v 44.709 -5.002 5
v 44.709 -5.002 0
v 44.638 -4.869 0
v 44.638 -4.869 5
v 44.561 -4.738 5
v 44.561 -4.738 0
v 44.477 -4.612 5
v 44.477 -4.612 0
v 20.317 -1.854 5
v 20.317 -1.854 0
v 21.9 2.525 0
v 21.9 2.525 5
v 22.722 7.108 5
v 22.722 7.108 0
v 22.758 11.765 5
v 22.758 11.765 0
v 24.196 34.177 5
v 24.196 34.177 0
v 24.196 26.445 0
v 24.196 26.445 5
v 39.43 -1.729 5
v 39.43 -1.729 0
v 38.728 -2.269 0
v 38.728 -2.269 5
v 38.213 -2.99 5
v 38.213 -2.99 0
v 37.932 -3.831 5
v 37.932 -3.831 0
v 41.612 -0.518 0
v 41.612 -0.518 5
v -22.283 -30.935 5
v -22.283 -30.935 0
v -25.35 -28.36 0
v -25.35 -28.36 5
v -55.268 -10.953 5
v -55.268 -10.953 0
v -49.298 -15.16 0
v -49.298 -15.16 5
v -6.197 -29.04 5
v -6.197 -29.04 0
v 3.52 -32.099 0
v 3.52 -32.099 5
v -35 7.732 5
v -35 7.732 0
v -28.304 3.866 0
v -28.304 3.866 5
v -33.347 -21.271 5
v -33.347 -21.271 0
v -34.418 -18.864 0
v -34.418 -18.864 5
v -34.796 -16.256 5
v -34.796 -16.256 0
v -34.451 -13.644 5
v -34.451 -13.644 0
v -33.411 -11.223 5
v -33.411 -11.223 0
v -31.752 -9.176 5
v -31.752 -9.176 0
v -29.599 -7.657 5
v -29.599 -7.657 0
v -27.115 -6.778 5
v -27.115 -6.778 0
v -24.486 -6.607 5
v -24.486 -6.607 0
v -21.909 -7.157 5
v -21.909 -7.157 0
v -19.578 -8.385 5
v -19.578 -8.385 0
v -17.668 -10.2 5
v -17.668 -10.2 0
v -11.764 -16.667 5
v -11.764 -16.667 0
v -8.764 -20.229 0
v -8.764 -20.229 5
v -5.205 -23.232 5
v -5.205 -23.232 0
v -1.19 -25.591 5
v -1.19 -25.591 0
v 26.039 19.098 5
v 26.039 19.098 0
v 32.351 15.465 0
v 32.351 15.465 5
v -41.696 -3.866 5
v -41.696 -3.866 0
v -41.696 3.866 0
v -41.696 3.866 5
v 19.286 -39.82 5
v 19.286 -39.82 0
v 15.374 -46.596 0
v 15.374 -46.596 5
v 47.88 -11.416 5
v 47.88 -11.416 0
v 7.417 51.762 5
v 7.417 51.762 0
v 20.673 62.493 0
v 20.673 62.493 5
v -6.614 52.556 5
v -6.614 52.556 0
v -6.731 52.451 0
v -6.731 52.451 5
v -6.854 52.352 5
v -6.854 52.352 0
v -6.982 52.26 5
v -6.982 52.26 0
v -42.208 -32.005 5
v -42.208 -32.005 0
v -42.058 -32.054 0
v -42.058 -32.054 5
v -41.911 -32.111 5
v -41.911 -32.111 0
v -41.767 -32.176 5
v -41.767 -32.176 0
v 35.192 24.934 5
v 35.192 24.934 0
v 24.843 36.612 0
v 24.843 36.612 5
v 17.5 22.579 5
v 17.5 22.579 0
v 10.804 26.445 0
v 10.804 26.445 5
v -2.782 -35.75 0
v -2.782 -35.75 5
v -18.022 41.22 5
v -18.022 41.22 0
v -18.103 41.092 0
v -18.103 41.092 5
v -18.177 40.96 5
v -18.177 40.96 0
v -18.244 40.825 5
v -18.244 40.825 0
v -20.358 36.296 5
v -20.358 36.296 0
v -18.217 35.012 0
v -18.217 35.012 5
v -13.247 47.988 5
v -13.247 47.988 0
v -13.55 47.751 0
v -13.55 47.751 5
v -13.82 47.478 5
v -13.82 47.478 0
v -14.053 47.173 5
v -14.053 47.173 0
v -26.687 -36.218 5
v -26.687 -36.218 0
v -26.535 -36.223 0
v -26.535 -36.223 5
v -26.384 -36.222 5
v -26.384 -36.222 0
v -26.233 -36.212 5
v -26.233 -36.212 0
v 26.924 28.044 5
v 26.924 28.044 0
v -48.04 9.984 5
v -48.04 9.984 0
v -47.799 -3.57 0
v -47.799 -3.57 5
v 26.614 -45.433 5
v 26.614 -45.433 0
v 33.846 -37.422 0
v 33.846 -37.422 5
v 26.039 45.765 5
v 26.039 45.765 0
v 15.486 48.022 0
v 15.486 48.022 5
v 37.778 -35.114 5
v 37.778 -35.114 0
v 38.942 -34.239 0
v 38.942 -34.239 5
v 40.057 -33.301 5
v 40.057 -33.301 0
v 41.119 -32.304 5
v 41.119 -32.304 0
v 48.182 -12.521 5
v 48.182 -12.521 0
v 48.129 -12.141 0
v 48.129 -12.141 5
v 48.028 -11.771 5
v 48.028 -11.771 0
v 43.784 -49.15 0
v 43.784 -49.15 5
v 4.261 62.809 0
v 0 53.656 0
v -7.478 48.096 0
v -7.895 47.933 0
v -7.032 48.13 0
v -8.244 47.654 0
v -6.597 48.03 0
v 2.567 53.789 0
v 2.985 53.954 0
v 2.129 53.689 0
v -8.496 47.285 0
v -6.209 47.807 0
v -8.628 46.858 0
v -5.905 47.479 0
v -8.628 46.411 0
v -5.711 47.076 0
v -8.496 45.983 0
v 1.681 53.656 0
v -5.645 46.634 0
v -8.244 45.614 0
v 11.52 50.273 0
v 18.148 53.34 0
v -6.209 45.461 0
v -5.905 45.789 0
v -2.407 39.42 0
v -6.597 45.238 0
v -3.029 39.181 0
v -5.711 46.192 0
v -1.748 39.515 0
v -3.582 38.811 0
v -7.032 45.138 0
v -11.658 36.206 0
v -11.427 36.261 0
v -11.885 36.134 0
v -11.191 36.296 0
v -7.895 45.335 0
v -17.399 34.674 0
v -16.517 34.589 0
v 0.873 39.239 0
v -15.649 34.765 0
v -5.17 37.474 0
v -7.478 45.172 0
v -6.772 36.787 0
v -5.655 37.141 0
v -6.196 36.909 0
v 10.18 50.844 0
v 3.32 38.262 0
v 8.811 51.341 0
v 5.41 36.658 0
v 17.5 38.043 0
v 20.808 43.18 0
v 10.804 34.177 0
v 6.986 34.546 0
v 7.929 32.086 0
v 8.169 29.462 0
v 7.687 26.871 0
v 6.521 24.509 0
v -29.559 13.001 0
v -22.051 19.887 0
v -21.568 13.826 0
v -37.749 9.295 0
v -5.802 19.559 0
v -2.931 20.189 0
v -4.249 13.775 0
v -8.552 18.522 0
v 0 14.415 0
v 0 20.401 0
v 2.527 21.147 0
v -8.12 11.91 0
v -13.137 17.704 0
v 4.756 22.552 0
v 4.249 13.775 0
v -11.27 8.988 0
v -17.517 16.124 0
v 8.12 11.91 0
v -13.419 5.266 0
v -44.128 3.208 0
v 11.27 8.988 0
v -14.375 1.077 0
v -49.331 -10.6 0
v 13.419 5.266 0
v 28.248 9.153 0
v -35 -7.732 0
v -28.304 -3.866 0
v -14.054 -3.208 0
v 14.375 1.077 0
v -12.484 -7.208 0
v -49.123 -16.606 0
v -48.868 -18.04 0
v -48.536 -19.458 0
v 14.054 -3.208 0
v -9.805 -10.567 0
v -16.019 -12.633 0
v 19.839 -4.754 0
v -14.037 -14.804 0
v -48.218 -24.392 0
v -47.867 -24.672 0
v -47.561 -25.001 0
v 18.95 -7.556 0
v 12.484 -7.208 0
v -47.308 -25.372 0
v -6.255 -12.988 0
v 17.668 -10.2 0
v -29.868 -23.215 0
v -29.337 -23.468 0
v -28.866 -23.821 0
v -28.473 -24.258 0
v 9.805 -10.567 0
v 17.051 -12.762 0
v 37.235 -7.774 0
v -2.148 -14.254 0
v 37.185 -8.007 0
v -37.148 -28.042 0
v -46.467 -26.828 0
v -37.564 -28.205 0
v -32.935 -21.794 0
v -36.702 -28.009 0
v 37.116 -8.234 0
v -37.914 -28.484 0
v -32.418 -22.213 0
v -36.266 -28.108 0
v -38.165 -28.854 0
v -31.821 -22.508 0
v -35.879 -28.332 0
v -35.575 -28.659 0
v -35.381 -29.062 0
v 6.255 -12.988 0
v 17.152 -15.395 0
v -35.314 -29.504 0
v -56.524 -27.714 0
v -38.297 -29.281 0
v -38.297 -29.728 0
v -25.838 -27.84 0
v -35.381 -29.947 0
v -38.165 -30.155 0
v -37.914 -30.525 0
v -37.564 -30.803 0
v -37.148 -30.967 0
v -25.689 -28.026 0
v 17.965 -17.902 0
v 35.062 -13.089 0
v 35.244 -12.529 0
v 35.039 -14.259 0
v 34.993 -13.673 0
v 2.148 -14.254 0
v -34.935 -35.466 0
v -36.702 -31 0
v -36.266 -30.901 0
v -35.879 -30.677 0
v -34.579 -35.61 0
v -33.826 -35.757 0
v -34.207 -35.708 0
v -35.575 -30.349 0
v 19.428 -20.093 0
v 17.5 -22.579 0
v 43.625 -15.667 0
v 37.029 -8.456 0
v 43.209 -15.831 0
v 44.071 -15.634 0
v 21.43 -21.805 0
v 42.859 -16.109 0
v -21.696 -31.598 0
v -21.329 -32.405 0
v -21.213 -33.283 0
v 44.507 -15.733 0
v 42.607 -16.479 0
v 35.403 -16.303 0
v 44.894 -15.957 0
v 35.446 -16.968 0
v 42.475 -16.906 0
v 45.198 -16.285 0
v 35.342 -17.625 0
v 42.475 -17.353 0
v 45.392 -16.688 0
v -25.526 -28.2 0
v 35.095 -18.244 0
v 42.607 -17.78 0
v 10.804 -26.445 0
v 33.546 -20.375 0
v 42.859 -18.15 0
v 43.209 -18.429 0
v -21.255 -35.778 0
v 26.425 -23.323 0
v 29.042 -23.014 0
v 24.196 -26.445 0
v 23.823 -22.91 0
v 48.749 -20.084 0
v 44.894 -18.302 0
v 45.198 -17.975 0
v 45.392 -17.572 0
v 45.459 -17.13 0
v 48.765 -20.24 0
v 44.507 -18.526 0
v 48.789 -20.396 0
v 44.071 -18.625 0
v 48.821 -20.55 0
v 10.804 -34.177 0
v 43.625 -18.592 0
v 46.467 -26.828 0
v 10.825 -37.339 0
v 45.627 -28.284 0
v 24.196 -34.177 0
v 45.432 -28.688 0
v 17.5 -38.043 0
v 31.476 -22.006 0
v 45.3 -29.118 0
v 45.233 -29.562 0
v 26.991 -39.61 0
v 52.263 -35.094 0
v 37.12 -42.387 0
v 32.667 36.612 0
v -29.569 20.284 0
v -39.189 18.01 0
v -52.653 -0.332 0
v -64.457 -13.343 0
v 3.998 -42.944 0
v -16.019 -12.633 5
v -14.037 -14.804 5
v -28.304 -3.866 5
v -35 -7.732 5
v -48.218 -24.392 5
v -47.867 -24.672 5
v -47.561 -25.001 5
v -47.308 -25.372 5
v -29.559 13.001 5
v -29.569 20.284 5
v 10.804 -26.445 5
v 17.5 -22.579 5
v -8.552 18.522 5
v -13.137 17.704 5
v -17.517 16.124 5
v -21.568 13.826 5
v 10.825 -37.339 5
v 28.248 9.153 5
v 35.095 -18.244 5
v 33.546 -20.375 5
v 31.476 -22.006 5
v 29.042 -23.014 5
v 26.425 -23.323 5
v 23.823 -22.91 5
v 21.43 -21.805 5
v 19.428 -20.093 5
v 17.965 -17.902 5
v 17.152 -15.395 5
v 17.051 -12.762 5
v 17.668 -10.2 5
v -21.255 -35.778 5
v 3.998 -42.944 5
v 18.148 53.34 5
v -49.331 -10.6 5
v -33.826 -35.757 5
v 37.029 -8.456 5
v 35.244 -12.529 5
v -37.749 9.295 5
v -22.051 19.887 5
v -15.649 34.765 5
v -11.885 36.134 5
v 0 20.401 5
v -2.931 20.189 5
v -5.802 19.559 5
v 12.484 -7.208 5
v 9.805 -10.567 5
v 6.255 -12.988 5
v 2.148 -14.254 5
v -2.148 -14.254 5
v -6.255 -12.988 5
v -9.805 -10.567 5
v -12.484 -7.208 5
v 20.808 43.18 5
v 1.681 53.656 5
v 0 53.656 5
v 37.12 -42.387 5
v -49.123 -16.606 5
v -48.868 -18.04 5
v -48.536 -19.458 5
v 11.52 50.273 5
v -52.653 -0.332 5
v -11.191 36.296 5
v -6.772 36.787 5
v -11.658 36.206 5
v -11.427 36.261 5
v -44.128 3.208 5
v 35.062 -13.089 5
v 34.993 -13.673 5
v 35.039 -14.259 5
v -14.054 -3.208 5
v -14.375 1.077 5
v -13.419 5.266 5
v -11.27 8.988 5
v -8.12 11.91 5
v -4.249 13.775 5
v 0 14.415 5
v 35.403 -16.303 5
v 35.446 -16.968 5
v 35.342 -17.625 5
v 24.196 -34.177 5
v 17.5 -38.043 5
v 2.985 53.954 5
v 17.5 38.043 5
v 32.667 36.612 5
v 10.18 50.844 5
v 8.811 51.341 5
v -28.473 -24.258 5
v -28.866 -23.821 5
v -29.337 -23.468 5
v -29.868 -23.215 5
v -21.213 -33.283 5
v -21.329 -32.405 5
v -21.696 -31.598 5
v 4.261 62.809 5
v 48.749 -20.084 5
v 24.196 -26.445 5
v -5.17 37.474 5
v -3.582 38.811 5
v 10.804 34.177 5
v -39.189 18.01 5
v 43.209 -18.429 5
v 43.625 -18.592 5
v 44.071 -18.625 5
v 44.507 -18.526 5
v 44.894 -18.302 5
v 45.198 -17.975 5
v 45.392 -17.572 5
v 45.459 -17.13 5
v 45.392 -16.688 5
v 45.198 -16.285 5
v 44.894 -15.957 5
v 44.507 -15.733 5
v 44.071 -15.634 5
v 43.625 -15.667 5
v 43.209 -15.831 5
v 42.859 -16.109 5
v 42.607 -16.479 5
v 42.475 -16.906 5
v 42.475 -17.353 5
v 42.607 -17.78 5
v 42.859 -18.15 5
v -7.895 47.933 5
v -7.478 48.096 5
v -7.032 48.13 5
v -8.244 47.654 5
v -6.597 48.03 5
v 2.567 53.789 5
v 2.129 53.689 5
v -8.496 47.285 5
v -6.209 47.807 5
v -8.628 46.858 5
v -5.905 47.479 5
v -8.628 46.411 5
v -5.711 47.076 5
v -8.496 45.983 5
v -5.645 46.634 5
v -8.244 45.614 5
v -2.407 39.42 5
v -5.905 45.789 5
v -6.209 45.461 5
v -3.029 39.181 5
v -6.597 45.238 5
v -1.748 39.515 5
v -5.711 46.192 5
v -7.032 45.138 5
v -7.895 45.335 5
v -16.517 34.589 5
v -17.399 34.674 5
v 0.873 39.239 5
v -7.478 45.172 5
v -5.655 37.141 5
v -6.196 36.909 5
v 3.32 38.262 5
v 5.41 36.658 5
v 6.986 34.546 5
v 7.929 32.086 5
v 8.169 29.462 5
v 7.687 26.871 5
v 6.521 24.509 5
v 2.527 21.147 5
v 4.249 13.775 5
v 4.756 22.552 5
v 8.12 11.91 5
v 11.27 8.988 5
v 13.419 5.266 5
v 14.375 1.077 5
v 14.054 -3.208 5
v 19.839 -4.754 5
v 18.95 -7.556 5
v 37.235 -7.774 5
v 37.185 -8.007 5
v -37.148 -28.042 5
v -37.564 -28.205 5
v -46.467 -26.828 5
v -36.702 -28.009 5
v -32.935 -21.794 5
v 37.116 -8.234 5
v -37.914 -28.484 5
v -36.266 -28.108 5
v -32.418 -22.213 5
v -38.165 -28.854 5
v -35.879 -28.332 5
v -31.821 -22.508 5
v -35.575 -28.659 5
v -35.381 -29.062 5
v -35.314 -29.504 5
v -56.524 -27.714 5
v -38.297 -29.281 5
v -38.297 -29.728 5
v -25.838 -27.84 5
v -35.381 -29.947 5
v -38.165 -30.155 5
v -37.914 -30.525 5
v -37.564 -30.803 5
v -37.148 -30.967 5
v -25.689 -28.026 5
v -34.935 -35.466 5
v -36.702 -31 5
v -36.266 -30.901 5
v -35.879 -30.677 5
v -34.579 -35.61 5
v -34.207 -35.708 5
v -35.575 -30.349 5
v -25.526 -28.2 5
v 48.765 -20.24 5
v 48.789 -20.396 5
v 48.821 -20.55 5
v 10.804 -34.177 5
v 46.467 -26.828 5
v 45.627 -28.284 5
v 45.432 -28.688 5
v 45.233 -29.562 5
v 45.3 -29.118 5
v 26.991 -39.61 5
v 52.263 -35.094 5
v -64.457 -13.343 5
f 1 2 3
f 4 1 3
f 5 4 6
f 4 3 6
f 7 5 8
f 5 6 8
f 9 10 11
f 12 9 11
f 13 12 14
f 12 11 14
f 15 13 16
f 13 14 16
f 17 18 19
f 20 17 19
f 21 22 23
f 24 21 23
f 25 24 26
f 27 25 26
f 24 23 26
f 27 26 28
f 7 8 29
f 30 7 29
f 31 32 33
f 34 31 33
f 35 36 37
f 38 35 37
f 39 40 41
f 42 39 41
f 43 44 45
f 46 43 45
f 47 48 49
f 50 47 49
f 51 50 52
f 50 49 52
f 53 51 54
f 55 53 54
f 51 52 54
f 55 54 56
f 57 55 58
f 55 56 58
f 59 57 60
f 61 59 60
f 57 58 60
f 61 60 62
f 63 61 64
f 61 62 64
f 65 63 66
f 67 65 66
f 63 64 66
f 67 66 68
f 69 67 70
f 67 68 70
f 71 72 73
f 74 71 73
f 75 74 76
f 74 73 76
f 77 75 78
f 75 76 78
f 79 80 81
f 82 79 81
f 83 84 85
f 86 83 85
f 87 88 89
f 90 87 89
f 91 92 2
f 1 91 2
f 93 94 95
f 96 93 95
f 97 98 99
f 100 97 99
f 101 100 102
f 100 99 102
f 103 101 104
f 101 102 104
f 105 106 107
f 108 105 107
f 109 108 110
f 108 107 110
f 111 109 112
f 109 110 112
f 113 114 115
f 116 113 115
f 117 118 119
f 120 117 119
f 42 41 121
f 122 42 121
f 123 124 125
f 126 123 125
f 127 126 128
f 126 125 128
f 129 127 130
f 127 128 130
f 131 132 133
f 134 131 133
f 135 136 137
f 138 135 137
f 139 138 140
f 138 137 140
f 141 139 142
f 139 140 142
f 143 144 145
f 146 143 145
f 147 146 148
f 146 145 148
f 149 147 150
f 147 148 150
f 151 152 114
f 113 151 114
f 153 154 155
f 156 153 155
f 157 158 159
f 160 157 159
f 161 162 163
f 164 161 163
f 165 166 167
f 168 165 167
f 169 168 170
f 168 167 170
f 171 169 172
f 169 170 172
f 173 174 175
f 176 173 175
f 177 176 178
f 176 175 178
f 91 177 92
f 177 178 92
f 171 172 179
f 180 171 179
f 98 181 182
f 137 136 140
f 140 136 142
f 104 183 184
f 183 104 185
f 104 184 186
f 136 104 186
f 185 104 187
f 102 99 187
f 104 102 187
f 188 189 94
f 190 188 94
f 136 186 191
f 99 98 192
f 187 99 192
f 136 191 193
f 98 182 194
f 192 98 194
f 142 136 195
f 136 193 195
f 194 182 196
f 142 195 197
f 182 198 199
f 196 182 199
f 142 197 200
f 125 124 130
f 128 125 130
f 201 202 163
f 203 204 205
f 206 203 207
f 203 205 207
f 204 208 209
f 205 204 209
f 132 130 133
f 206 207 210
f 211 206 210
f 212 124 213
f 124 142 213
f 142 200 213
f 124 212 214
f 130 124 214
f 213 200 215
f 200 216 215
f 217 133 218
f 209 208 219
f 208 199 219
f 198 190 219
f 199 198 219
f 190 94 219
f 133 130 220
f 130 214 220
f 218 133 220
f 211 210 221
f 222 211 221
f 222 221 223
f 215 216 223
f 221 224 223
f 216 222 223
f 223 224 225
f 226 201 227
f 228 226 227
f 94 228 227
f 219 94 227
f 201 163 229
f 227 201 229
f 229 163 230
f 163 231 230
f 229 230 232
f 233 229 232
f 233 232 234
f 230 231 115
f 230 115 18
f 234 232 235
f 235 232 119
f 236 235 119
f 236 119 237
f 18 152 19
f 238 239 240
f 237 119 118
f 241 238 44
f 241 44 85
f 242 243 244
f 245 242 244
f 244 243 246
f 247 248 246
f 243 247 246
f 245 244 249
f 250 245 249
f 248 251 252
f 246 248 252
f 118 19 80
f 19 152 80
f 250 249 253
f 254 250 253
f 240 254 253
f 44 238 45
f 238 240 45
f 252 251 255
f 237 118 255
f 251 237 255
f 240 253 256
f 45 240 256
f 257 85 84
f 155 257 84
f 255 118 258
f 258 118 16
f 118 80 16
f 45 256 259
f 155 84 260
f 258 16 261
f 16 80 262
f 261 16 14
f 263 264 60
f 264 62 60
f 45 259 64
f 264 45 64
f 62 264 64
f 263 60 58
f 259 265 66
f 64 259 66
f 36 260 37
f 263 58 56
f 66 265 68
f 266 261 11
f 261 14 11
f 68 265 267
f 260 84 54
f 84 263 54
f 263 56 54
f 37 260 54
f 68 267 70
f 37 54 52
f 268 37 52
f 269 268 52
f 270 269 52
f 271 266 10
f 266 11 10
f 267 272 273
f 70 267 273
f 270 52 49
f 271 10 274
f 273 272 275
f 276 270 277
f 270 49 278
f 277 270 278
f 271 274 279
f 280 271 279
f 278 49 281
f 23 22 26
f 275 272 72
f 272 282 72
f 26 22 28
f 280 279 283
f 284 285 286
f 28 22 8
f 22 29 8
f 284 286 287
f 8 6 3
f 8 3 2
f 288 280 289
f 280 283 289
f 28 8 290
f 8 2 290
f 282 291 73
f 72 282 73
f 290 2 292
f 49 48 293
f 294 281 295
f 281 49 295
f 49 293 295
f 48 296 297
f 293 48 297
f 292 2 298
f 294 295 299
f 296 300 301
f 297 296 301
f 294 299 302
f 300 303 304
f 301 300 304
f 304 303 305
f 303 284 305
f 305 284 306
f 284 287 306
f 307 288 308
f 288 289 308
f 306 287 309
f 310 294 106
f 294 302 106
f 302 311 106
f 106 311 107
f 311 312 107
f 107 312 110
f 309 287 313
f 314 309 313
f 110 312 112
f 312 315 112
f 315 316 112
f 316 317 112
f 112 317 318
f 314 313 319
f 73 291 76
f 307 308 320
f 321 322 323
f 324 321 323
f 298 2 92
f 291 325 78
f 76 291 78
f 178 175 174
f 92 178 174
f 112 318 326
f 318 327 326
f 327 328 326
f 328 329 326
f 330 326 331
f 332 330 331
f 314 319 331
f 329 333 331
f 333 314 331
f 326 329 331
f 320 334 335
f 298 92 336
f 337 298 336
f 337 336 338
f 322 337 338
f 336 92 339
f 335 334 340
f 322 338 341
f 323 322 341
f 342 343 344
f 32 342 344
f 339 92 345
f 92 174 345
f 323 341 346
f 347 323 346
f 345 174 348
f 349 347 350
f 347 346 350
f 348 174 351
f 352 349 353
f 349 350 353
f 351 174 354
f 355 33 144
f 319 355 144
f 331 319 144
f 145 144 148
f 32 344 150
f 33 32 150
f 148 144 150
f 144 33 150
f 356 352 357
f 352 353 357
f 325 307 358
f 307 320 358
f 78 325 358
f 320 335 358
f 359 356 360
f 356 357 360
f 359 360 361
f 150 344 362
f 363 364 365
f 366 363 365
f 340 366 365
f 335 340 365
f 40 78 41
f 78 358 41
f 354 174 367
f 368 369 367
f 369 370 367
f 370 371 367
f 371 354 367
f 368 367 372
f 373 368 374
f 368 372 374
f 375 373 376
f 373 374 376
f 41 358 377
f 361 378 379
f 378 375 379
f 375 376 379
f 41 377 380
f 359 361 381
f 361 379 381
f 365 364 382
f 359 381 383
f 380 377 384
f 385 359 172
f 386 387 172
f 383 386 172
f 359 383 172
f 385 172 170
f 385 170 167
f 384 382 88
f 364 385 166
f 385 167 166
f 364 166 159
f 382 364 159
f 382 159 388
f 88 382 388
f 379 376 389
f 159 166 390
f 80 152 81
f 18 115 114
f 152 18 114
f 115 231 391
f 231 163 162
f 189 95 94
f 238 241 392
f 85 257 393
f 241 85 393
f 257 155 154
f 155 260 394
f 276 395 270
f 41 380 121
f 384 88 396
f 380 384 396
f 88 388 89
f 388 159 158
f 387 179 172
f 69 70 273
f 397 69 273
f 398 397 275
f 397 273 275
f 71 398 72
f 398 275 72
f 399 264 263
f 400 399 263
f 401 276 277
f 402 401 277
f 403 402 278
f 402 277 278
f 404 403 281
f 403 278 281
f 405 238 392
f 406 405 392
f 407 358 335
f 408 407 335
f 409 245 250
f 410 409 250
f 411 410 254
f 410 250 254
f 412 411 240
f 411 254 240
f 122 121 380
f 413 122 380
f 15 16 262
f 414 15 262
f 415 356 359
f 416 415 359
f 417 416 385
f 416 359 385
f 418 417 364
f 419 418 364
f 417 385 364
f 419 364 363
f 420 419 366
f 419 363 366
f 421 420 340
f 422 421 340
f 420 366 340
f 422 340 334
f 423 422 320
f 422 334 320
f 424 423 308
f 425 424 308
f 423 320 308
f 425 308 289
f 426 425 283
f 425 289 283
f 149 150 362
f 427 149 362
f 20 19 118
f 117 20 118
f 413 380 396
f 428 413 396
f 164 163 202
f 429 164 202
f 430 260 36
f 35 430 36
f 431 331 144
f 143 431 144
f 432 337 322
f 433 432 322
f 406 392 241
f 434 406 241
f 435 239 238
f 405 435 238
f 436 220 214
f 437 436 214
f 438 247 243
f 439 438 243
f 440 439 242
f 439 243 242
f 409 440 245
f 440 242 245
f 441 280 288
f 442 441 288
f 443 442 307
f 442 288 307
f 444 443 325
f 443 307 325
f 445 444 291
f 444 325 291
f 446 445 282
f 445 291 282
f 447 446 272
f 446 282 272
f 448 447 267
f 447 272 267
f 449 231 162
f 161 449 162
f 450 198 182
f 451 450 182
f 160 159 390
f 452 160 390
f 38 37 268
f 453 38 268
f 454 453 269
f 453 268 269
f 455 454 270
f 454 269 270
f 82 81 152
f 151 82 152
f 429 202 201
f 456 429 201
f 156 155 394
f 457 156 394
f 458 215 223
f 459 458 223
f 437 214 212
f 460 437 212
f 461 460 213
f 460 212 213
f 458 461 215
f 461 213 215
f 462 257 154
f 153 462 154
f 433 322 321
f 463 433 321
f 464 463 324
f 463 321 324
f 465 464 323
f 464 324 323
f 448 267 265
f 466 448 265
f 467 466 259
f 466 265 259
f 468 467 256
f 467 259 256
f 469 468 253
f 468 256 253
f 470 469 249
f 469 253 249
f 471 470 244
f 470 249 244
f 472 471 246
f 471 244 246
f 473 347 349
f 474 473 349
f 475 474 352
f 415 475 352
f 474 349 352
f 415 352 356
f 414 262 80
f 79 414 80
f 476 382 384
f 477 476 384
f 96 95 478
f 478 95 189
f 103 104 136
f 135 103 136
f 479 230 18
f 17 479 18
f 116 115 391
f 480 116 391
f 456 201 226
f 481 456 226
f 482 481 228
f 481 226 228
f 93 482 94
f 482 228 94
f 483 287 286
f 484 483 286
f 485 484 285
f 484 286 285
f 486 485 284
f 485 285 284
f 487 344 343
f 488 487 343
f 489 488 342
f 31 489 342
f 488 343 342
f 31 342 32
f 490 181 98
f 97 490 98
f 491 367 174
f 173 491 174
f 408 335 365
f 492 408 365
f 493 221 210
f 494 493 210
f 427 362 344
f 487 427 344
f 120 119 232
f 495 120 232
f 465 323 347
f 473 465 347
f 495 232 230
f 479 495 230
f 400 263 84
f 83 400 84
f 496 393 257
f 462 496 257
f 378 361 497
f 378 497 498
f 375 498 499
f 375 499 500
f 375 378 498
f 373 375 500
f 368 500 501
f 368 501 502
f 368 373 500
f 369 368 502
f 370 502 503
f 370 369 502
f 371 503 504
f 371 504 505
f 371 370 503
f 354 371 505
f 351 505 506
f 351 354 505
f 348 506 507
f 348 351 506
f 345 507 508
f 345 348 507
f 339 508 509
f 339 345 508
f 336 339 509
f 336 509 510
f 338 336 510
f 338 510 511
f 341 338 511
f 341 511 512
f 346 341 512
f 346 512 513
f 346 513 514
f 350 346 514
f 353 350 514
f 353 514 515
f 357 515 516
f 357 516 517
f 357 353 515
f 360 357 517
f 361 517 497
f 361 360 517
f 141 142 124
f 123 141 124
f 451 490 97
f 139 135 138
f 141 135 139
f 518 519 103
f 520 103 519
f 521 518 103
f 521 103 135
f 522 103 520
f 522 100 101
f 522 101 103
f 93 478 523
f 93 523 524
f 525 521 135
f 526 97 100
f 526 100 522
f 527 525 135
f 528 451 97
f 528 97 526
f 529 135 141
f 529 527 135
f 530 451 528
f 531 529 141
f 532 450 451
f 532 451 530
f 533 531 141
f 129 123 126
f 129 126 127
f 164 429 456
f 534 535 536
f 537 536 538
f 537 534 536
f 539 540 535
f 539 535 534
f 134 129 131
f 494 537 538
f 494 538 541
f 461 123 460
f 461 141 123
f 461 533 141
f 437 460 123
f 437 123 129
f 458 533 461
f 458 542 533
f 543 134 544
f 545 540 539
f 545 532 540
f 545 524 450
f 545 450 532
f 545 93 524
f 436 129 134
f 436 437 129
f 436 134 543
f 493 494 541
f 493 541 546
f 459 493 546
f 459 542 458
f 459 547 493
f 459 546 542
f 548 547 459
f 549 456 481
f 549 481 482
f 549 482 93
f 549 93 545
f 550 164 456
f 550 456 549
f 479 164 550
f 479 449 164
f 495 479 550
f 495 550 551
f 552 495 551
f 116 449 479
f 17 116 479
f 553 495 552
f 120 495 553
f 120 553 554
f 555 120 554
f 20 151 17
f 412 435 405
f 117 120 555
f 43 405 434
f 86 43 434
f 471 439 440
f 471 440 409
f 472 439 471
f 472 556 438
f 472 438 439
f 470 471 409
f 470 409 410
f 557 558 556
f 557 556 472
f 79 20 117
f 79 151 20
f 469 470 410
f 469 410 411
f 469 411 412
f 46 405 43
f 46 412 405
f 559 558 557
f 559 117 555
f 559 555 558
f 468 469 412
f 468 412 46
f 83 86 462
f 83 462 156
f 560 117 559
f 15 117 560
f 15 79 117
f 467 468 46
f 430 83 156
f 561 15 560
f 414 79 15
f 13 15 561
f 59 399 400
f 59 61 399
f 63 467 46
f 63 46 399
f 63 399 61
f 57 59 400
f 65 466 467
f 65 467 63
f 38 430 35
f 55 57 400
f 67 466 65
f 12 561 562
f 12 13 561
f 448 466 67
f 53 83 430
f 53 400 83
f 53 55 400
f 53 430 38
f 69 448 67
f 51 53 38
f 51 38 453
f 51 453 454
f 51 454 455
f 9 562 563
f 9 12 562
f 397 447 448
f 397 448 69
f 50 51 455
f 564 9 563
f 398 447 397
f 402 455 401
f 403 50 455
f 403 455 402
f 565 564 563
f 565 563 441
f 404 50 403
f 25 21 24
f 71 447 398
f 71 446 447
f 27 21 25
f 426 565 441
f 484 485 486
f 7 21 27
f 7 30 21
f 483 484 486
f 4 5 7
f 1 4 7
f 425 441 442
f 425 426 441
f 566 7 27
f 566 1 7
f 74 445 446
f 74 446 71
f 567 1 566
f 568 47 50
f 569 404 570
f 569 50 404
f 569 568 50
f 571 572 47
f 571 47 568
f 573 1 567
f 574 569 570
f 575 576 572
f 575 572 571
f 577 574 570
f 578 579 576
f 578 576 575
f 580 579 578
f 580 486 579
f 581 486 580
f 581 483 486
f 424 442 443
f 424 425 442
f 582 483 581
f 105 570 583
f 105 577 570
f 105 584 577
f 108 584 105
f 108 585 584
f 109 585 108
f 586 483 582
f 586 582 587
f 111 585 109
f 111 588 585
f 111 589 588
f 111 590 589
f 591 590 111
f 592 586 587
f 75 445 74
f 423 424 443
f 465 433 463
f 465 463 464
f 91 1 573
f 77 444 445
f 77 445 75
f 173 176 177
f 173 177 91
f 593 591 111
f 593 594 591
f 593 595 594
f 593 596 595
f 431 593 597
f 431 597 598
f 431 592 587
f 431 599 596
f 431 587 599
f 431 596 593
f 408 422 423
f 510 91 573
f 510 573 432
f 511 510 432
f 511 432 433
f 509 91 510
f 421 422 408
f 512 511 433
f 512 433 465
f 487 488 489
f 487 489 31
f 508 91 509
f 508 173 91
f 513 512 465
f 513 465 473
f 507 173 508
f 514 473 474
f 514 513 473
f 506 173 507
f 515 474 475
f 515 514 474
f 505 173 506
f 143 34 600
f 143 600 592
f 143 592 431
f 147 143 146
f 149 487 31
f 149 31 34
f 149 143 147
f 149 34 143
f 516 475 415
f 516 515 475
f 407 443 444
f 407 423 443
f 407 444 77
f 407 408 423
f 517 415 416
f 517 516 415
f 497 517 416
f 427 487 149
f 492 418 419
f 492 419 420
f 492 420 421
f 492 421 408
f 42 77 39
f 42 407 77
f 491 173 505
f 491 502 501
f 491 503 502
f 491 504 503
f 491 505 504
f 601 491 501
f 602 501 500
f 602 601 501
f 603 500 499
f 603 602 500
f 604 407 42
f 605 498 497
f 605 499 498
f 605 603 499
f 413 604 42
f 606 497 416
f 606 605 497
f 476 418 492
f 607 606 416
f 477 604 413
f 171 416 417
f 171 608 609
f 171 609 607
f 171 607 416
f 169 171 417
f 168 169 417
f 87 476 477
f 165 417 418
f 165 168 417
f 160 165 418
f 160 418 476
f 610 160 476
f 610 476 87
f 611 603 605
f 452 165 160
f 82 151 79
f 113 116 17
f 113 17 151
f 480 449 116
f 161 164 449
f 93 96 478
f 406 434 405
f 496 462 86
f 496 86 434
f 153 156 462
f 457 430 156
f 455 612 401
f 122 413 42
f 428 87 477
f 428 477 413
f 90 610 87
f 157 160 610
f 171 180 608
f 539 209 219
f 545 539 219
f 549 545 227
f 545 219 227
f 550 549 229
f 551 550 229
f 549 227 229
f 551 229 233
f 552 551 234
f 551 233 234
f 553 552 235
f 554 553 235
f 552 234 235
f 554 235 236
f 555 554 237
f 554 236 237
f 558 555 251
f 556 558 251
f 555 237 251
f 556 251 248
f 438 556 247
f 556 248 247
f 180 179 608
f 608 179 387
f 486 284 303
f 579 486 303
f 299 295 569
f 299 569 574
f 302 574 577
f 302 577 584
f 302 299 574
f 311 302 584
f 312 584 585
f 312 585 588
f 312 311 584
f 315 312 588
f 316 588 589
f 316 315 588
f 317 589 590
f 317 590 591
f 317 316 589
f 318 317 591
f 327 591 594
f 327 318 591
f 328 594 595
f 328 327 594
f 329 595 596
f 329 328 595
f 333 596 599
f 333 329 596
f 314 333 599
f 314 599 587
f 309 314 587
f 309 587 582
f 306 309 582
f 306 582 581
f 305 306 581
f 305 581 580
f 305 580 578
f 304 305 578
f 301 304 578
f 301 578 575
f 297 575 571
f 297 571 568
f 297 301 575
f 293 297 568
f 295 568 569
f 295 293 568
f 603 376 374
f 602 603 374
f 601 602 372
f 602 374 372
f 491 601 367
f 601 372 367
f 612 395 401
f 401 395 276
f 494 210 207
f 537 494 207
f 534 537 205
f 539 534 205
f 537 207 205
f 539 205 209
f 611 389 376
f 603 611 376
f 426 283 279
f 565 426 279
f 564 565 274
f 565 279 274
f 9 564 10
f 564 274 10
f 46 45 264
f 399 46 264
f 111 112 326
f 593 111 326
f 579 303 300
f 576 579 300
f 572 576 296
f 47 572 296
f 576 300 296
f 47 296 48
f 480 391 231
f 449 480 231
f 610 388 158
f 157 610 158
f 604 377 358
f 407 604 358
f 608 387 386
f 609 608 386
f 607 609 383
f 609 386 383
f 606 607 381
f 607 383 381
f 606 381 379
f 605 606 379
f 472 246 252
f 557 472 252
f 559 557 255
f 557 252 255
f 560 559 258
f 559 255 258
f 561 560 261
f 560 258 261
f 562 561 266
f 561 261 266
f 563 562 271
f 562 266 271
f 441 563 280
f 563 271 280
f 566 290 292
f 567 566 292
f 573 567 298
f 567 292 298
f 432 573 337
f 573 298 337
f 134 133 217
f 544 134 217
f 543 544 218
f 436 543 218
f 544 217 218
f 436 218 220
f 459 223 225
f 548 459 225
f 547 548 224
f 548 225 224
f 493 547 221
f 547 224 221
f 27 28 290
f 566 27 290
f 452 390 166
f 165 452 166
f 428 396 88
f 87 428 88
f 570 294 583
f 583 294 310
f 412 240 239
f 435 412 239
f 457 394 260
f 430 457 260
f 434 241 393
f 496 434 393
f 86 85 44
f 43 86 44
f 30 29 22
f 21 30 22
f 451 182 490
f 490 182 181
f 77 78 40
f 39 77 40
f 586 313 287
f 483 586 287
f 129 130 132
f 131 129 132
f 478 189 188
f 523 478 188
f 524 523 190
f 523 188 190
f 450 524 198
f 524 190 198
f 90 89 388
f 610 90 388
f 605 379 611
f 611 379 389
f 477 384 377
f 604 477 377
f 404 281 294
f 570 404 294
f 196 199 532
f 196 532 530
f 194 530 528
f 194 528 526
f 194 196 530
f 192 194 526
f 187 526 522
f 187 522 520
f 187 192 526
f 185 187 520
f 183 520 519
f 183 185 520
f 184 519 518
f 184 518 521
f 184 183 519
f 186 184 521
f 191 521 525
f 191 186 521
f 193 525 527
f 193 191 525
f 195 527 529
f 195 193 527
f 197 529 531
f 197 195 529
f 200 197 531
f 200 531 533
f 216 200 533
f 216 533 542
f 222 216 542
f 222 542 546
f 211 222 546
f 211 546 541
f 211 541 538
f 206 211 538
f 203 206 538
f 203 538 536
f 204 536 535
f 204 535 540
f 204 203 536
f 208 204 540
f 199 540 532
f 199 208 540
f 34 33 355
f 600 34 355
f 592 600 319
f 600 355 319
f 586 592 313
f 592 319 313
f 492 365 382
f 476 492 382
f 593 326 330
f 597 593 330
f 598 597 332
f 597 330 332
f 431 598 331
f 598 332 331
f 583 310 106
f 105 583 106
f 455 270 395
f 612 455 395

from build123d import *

# Parameters (mm, degrees)
F0_R     = 1.5
F1_DEPTH = 5
F3_COUNT = 3


# Not quite as in the source:
# - a feature names something its author has since deleted; it is built from what else it names


with BuildPart() as f1:
    # F0 (on Top) → F1 (new body)
    with BuildSketch(Plane.XY):
        with BuildLine():
            ThreePointArc((-1.7478732612, 39.5149783142), (8.1392001596, 30.7821912097), (0, 20.4009960858))
            Line((0, 20.4009960858), (0, 14.4152096754))
            ThreePointArc((0, 14.4152096754), (12.4839377798, 7.2076048377), (12.4839377798, -7.2076048377))
            Line((12.4839377798, -7.2076048377), (17.6677808728, -10.2004980429))
            ThreePointArc((17.6677808728, -10.2004980429), (19.4452285789, -6.171201407), (20.3165472355, -1.8543326892))
            ThreePointArc((20.3165472355, -1.8543326892), (22.4085751719, 4.7991946551), (22.7576271971, 11.7651238603))
            Line((22.7576271971, 11.7651238603), (28.2481051981, 9.1530177742))
            Line((28.2481051981, 9.1530177742), (26.0387565941, 19.0982837094))
            Line((26.0387565941, 19.0982837094), (32.3511809111, 15.4654439539))
            Line((32.3511809111, 15.4654439539), (26.9242947963, 28.0441137764))
            Line((26.9242947963, 28.0441137764), (35.1917743683, 24.9340832233))
            Line((35.1917743683, 24.9340832233), (24.8427105993, 36.6120710969))
            Line((24.8427105993, 36.6120710969), (32.6668024063, 36.6120710969))
            Line((32.6668024063, 36.6120710969), (20.8077298225, 43.1800760308))
            Line((20.8077298225, 43.1800760308), (26.0387565941, 45.7650870085))
            Line((26.0387565941, 45.7650870085), (15.485866915, 48.02231204))
            Line((15.485866915, 48.02231204), (18.1482266635, 53.3400028944))
            Line((18.1482266635, 53.3400028944), (11.520179105, 50.2734731867))
            ThreePointArc((11.520179105, 50.2734731867), (9.4992839441, 51.1021592503), (7.4171009474, 51.7618954182))
            Line((7.4171009474, 51.7618954182), (20.6731967628, 62.493018806))
            Line((20.6731967628, 62.493018806), (2.9851620813, 53.9539658583))
            ThreePointArc((2.9851620813, 53.9539658583), (2.3498823759, 53.7311579429), (1.6809146705, 53.6556206644))
            Line((1.6809146705, 53.6556206644), (0, 53.6556206644))
            Line((0, 53.6556206644), (4.2608887888, 62.8086403012))
            Line((4.2608887888, 62.8086403012), (-6.6135251858, 52.5556231266))
            ThreePointArc((-6.6135251858, 52.5556231266), (-6.7917072446, 52.4004137483), (-6.9815525166, 52.2597099106))
            Line((-6.9815525166, 52.2597099106), (-13.2472028108, 47.9876733272))
            ThreePointArc((-13.2472028108, 47.9876733272), (-13.6895314092, 47.6192351761), (-14.0533422232, 47.1730928761))
            Line((-14.0533422232, 47.1730928761), (-18.0220315222, 41.2200618552))
            ThreePointArc((-18.0220315222, 41.2200618552), (-18.1407171431, 41.0265497088), (-18.2444304369, 40.824617096))
            Line((-18.2444304369, 40.824617096), (-20.3575752676, 36.2964496017))
            Line((-20.3575752676, 36.2964496017), (-18.2173253559, 35.0123005809))
            ThreePointArc((-18.2173253559, 35.0123005809), (-16.9608718875, 34.5985427406), (-15.6486105692, 34.7653992696))
            Line((-15.6486105692, 34.7653992696), (-11.8852458251, 36.1338942554))
            ThreePointArc((-11.8852458251, 36.1338942554), (-11.5431146027, 36.2357083507), (-11.1913122519, 36.2961648589))
            Line((-11.1913122519, 36.2961648589), (-6.7715043443, 36.7872549082))
            ThreePointArc((-6.7715043443, 36.7872549082), (-5.920047927, 37.0118969078), (-5.1704976221, 37.4740834492))
            Line((-5.1704976221, 37.4740834492), (-3.5822876233, 38.8113983631))
            ThreePointArc((-3.5822876233, 38.8113983631), (-2.7243104061, 39.3176161279), (-1.7478732612, 39.5149783142))
        make_face()
        with Locations((-7.1445683185, 46.6340765733)):
            Circle(F0_R, mode=Mode.SUBTRACT)
        Polygon((10.8037195943, 34.1769884273), (17.5, 38.0430877221), (24.1962804057, 34.1769884273), (24.1962804057, 26.4447898377), (17.5, 22.5786905429), (10.8037195943, 26.4447898377), align=None, mode=Mode.SUBTRACT)
    extrude(amount=F1_DEPTH)

    # F3: F1 ×3 about axis
    f3_axis = Axis((0, 0, 21.8280367553), (0, 0, 1))


with BuildPart() as f1_1:
    add(f1.part)
    for i in range(1, F3_COUNT):
        add(f1.part.rotate(f3_axis, i * 360 / F3_COUNT))


solid = f1_1.part
